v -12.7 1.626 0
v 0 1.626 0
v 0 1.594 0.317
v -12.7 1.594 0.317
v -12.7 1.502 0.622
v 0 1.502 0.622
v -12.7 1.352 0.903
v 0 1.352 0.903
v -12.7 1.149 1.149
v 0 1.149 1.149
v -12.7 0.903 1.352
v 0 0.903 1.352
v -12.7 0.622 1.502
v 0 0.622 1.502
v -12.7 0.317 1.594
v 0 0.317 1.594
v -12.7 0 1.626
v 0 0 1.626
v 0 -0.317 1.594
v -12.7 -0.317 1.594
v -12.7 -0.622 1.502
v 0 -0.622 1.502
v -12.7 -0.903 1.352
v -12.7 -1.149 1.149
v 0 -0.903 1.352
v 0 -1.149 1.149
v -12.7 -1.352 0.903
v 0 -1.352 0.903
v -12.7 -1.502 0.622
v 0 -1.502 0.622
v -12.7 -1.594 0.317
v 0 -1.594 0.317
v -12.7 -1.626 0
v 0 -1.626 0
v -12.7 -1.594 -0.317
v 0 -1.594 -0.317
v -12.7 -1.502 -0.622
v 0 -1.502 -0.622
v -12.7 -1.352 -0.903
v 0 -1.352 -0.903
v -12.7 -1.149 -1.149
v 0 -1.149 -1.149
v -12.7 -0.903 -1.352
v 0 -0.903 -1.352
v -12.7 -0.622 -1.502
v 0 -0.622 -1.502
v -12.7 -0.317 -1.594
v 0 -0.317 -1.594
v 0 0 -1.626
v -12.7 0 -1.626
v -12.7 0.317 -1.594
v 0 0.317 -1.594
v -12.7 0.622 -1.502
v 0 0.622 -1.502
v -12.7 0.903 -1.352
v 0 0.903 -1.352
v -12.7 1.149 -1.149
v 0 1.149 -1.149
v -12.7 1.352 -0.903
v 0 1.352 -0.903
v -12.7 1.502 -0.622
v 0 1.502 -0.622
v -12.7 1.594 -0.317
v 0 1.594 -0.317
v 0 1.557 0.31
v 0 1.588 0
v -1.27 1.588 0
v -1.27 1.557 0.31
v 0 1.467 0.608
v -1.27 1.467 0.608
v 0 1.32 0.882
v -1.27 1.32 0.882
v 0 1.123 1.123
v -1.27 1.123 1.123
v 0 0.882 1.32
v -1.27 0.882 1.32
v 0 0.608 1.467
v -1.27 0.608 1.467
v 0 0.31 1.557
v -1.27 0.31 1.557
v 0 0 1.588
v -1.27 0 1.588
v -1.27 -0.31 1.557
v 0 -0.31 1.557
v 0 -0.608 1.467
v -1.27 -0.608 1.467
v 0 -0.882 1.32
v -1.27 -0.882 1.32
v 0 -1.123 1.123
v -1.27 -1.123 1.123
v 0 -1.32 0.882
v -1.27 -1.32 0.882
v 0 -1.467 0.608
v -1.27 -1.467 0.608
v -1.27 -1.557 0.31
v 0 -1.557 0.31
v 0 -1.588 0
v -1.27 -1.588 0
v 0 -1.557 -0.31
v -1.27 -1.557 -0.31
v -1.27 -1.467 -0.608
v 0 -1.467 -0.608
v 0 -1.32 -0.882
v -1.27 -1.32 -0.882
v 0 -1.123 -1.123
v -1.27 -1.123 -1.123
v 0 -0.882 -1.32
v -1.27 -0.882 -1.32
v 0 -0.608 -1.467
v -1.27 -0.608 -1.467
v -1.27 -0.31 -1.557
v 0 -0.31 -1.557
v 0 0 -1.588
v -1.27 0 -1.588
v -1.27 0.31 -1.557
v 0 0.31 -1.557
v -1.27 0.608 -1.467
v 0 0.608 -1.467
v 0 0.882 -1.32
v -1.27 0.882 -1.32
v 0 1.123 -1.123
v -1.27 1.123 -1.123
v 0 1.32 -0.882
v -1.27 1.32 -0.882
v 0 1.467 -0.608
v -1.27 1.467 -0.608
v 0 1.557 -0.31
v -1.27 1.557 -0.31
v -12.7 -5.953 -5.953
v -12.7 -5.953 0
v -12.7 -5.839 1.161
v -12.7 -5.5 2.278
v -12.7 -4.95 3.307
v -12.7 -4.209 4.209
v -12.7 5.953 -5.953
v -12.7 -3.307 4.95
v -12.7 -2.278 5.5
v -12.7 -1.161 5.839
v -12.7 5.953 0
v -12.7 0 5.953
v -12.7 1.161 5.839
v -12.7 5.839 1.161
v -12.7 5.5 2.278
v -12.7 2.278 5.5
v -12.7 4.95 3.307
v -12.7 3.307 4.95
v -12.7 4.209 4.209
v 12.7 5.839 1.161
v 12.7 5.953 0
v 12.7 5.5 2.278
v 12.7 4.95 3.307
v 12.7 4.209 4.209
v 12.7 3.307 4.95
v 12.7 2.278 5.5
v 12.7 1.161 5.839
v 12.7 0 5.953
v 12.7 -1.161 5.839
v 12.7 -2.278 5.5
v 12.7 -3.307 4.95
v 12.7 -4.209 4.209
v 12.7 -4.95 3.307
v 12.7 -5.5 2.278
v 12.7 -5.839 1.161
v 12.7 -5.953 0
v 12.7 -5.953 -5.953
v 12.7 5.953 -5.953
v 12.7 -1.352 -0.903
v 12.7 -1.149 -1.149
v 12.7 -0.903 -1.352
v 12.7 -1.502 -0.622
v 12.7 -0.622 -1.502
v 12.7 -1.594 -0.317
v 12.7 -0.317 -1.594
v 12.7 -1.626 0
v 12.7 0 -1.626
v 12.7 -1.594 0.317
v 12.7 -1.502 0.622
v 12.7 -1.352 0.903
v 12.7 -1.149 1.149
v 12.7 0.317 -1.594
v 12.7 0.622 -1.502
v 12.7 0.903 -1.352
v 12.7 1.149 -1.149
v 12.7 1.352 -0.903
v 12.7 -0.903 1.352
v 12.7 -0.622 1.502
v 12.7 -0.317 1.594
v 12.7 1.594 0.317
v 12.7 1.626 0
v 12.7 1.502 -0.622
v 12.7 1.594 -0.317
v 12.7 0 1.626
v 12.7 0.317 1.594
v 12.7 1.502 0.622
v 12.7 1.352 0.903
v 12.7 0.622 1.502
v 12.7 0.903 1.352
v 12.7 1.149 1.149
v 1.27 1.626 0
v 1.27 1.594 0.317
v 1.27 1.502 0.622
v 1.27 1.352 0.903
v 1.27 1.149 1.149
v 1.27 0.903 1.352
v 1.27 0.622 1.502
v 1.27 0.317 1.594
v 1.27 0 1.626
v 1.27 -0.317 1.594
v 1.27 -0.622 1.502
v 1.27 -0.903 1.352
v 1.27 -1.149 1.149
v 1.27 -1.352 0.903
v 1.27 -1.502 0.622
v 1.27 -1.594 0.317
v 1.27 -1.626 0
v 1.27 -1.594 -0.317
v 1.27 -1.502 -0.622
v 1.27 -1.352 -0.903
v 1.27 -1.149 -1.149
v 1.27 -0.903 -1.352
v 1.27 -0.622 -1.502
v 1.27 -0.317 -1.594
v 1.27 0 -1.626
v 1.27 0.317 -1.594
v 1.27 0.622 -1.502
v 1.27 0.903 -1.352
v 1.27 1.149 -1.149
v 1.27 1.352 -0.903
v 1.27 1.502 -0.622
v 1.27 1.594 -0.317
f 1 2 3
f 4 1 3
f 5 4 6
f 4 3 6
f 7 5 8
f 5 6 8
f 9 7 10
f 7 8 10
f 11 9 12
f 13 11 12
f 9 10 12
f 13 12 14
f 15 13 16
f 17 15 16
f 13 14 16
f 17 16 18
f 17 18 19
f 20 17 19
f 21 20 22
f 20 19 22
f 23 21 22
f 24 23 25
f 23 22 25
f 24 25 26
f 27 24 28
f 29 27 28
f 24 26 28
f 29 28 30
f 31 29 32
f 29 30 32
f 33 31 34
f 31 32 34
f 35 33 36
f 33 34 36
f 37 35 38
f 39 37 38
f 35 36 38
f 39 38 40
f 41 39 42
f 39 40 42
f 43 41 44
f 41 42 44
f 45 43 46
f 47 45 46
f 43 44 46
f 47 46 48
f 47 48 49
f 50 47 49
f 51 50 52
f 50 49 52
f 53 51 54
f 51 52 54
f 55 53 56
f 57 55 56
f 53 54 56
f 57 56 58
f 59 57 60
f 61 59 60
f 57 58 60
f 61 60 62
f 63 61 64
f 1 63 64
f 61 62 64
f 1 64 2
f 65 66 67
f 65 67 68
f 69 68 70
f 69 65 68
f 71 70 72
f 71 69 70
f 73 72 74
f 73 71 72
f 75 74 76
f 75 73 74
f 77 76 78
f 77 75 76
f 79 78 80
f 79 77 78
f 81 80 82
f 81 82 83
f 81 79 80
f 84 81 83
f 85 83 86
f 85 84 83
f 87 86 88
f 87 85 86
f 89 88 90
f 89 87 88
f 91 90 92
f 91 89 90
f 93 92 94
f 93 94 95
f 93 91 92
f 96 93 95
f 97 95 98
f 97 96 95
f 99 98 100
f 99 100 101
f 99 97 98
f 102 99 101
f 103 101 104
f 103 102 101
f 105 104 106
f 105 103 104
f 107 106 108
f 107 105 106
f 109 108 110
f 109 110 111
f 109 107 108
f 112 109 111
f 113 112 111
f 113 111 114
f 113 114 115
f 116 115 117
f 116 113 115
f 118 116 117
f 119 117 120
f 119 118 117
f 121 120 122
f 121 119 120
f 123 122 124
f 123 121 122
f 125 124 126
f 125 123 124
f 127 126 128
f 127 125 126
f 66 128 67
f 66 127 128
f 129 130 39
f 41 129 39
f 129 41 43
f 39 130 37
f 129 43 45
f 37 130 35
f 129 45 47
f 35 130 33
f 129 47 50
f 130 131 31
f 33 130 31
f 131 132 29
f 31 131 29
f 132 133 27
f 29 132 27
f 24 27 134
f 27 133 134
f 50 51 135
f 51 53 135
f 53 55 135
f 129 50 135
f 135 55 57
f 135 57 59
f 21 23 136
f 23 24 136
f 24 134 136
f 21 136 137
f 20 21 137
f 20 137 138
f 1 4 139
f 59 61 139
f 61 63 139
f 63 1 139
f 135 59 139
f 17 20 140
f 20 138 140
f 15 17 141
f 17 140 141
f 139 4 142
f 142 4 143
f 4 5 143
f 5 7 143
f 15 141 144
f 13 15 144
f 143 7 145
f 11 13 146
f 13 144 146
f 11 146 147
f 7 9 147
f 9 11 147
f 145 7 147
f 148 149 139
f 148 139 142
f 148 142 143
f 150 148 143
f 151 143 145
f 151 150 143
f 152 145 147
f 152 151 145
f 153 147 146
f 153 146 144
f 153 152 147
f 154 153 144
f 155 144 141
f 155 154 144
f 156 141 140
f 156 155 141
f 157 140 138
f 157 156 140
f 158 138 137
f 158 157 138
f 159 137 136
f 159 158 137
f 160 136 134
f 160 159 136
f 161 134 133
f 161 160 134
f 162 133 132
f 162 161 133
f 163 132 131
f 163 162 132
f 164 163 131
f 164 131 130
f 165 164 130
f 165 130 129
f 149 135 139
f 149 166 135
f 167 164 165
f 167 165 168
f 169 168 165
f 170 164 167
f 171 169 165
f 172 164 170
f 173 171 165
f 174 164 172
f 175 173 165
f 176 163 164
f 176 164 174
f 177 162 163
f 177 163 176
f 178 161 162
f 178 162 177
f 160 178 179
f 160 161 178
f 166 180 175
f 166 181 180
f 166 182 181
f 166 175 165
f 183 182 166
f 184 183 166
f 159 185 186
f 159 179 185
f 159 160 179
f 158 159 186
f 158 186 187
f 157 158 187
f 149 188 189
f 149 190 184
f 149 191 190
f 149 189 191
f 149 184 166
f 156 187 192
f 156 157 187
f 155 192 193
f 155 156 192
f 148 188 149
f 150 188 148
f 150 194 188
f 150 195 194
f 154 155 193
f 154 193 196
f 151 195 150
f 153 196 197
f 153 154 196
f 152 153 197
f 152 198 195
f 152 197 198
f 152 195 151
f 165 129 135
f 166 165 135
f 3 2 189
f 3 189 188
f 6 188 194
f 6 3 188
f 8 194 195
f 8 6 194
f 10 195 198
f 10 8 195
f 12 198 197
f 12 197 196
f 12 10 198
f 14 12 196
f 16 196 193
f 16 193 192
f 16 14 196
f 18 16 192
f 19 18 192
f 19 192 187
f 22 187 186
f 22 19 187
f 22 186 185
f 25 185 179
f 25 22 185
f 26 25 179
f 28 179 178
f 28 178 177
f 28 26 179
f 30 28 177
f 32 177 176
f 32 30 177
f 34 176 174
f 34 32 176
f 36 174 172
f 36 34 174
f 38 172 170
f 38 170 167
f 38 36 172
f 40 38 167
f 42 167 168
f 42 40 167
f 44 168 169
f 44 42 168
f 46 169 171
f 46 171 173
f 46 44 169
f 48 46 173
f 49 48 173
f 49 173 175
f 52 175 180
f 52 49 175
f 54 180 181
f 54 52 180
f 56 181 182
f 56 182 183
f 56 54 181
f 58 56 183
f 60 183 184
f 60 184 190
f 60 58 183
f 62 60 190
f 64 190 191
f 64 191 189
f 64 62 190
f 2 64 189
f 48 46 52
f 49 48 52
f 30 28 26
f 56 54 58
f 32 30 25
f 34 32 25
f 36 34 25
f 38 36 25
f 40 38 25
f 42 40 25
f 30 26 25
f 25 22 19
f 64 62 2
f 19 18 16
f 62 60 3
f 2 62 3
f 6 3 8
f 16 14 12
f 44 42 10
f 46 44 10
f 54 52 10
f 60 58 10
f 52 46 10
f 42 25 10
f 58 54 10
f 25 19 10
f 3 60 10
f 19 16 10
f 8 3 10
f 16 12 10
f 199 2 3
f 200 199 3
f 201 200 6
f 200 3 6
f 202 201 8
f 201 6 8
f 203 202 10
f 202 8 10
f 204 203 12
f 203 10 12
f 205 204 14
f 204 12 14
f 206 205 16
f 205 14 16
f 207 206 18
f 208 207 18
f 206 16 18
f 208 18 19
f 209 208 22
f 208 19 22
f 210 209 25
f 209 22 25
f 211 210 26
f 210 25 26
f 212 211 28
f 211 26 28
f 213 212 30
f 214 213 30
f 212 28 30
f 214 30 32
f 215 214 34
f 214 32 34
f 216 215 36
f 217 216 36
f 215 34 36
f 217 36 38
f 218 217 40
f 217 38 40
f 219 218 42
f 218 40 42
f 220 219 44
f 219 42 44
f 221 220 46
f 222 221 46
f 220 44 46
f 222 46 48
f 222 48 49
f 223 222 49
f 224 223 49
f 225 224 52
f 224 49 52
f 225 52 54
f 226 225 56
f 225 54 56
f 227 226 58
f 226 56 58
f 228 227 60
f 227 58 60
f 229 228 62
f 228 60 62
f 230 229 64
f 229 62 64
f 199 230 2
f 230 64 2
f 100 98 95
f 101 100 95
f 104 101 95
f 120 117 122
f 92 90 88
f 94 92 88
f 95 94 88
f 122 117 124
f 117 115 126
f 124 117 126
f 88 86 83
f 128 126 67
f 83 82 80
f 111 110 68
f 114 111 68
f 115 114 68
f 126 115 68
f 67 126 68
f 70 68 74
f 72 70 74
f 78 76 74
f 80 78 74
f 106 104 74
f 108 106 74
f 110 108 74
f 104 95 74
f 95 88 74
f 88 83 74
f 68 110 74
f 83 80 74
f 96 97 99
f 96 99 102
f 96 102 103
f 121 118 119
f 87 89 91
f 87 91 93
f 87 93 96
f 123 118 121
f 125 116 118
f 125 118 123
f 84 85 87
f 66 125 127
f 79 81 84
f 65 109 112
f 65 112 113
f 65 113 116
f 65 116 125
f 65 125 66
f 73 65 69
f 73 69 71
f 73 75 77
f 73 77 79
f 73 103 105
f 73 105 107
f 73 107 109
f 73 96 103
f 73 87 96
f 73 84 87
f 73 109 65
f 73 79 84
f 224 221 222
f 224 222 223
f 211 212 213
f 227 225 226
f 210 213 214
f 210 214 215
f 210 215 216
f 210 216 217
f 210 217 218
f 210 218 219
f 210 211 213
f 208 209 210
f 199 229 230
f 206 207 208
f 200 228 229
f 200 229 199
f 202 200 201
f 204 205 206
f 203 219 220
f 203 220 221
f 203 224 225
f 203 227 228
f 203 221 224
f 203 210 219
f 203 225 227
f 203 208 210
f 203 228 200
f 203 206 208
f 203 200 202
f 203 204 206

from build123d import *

# Parameters (mm, degrees)
F0_R     = 1.6256
F1_DEPTH = 12.7
F3_DEPTH = 1.27
F2_R     = 1.5875
F4_DEPTH = 1.27
F5_DEPTH = 12.7


# Not quite as in the source:
# - a feature names something its author has since deleted; it is built from what else it names


with BuildPart() as f1:
    # F0 (on Right) → F1 (new body)
    with BuildSketch(Plane.YZ):
        with BuildLine():
            ThreePointArc((0, -5.953125), (4.2094950568, -4.2094950568), (5.953125, 0))
            ThreePointArc((5.953125, 0), (0, 5.953125), (-5.953125, 0))
            ThreePointArc((-5.953125, 0), (-4.2094950568, -4.2094950568), (0, -5.953125))
        make_face()
        Circle(F0_R, mode=Mode.SUBTRACT)
        with BuildLine():
            Line((5.953125, -5.953125), (5.953125, 0))
            ThreePointArc((5.953125, 0), (4.2094950568, -4.2094950568), (0, -5.953125))
            Line((0, -5.953125), (5.953125, -5.953125))
        make_face()
        with BuildLine():
            ThreePointArc((0, -5.953125), (-4.2094950568, -4.2094950568), (-5.953125, 0))
            Line((-5.953125, 0), (-5.953125, -5.953125))
            Line((-5.953125, -5.953125), (0, -5.953125))
        make_face()
    extrude(amount=F1_DEPTH)

    # F0 (on Right) → F5 (join)
    with BuildSketch(Plane.YZ):
        with BuildLine():
            ThreePointArc((0, -5.953125), (4.2094950568, -4.2094950568), (5.953125, 0))
            ThreePointArc((5.953125, 0), (0, 5.953125), (-5.953125, 0))
            ThreePointArc((-5.953125, 0), (-4.2094950568, -4.2094950568), (0, -5.953125))
        make_face()
        Circle(F0_R, mode=Mode.SUBTRACT)
        with BuildLine():
            Line((5.953125, -5.953125), (5.953125, 0))
            ThreePointArc((5.953125, 0), (4.2094950568, -4.2094950568), (0, -5.953125))
            Line((0, -5.953125), (5.953125, -5.953125))
        make_face()
        with BuildLine():
            ThreePointArc((0, -5.953125), (-4.2094950568, -4.2094950568), (-5.953125, 0))
            Line((-5.953125, 0), (-5.953125, -5.953125))
            Line((-5.953125, -5.953125), (0, -5.953125))
        make_face()
    extrude(amount=-F5_DEPTH)


with BuildPart() as f3:
    # F0 (on Right) → F3 (new body)
    with BuildSketch(Plane.YZ):
        Circle(F0_R)
    extrude(amount=F3_DEPTH)


with BuildPart() as f4:
    # F2 (on Right) → F4 (new body)
    with BuildSketch(Plane.YZ):
        Circle(F2_R)
    extrude(amount=-F4_DEPTH)


solid = Compound([f1.part, f3.part, f4.part])
